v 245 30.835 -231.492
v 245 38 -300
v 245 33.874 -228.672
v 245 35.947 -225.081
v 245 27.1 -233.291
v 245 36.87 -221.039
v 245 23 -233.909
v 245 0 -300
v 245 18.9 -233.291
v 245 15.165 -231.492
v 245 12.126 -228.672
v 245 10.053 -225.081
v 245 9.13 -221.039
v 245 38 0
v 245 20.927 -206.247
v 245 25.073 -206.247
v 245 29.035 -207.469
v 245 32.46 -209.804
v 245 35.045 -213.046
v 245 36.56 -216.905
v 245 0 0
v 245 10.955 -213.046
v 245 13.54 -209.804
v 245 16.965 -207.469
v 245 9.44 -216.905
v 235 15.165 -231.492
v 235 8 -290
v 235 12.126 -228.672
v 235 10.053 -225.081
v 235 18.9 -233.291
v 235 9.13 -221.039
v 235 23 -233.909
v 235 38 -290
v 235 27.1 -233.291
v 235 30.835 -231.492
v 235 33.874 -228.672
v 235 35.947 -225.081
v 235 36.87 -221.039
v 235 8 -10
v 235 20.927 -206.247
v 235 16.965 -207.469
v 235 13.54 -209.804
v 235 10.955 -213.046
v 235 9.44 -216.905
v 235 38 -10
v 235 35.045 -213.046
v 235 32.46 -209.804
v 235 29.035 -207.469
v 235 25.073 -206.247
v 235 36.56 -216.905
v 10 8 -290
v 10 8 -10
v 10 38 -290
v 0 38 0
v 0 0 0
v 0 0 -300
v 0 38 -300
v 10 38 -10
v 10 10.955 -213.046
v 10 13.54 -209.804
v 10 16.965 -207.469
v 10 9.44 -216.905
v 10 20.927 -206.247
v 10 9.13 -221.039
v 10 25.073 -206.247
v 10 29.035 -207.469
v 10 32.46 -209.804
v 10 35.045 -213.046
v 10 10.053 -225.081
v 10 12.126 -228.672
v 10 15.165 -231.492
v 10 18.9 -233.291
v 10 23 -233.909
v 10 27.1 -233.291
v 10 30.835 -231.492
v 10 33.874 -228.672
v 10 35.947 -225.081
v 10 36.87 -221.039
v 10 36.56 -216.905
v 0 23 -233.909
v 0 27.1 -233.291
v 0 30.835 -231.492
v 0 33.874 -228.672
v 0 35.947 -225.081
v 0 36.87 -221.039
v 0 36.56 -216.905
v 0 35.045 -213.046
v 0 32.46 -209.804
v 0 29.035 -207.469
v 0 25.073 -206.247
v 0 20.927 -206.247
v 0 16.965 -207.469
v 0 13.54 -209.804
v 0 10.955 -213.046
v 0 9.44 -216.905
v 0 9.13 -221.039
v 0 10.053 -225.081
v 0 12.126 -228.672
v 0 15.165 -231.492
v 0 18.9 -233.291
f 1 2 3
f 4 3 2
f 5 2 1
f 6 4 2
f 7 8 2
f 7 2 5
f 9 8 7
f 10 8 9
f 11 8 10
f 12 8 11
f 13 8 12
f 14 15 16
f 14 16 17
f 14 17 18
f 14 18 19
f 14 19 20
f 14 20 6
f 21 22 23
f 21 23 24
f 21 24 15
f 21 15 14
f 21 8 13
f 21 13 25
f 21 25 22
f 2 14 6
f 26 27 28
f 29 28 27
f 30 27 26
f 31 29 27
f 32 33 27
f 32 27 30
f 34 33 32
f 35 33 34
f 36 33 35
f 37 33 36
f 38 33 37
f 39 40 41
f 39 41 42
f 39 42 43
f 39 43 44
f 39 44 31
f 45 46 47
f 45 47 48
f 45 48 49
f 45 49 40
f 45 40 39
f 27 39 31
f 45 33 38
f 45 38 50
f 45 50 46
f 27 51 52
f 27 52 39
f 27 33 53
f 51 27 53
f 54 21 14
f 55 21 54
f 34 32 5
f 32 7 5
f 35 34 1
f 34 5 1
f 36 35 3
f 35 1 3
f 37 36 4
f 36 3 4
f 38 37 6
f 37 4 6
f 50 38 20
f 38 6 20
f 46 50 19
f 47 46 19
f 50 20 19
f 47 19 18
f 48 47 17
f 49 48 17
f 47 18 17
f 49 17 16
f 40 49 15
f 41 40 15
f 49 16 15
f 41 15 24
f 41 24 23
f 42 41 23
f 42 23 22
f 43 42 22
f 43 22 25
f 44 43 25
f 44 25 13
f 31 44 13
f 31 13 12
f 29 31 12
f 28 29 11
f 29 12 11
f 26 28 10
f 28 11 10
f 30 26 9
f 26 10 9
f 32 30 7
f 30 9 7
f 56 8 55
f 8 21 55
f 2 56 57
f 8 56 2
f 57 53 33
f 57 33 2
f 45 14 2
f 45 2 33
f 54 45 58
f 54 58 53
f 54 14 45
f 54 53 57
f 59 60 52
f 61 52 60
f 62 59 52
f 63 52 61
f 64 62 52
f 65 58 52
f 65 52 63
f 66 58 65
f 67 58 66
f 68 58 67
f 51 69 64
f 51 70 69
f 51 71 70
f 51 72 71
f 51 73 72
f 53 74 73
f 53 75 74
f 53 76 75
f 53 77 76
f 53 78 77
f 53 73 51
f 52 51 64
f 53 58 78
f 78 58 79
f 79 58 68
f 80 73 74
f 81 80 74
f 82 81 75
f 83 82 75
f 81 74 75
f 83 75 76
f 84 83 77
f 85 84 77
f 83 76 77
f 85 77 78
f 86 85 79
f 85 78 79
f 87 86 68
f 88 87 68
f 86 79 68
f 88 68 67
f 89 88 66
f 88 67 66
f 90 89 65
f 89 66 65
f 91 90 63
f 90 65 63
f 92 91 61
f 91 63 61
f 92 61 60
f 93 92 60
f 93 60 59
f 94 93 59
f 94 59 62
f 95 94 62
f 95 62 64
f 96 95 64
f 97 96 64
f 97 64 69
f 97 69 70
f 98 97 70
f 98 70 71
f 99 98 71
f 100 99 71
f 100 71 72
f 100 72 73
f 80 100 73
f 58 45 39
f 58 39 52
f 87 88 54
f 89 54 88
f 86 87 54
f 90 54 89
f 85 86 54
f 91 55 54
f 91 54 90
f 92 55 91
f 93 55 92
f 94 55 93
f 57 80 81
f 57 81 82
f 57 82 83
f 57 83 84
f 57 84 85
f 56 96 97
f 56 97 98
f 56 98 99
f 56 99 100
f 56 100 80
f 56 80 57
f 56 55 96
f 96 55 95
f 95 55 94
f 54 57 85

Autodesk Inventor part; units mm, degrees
ref_plane "YZ Plane" through (0, 0, 0) normal (1, 0, 0) x (0, 1, 0)
ref_plane "XZ Plane" through (0, 0, 0) normal (0, 1, 0) x (-1, 0, 0)
ref_plane "XY Plane" through (0, 0, 0) normal (0, 0, 1) x (1, 0, 0)
sketch "Sketch1" plane through (0, 0, 0) normal (0, 1, 0) x (-1, 0, 0)
  line L0 (0, 0) -> (0, -250)
  line L1 (-200, 0) -> (0, 0)
  line L2 (0, -250) -> (0, -300)
  line L3 (0, -300) -> (-200, -300)
  line L4 (-200, -300) -> (-230, -300)
  line L5 (-230, 0) -> (-200, 0)
  line L6 (-230, -300) -> (-245, -300)
  line L7 (-245, -300) -> (-245, 0)
  line L8 (-245, 0) -> (-230, 0)
  dimension "d0" = 250
  dimension "d4" = 50
  dimension "d12" = 30
  dimension "d24" = 15
extrude "Extrusion1" add sketch "Sketch1" along normal blind 38
sketch "Sketch2" plane through (0, 38, 0) normal (0, 1, 0) x (1, 0, 0)
  line L0 (0, 300) -> (0, 0) projected
  line L1 (0, 0) -> (245, 0) projected
  line L2 (10, 10) -> (10, 290)
  line L3 (245, 300) -> (0, 300) projected
  line L4 (245, 0) -> (245, 300) projected
  line L5 (245, 290) -> (235, 290)
  line L6 (235, 290) -> (235, 10)
  line L7 (235, 290) -> (10, 290)
  line L8 (0, 300) -> (0, 0) projected
  line L9 (235, 10) -> (10, 10)
  dimension "d25" = 10
extrude "Extrusion2" cut sketch "Sketch2" against normal blind 30 contours L6 L9 L2 L7
sketch "Sketch5" plane through (0, 0, 0) normal (0, -1, 0) x (1, 0, 0)
  point P0 (0, 0)
sketch "Sketch6" plane through (0, 8, 0) normal (0, 1, 0) x (1, 0, 0)
  point P0 (0, 0)
sketch "Sketch7" plane through (0, 8, 0) normal (0, 1, 0) x (1, 0, 0)
  line L0 (10, 290) -> (235, 290) projected
  line L1 (235, 10) -> (10, 10) projected
  line L2 (235, 290) -> (10, 10)
  line L3 (10, 10) -> (10, 290) projected
  line L4 (235, 10) -> (10, 290)
  point P0 (0, 0)
sketch "Sketch8" plane through (245, 0, 0) normal (1, 0, 0) x (0, 0, -1)
  line L0 (0, 38) -> (300, 38) projected
  line L1 (0, 0) -> (300, 0) projected
  line L2 (0, 0) -> (0, 38) projected
  line L3 (150, 38) -> (150, 8)
  line L4 (290, 8) -> (10, 8) projected
  line L5 (150, 8) -> (290, 8)
  line L6 (290, 38) -> (290, 8) projected
  line L7 (290, 8) -> (290, 38)
  line L8 (290, 38) -> (150, 38)
  line L9 (290, 38) -> (10, 38) projected
  line L10 (150, 8) -> (290, 38)
  line L11 (290, 38) -> (150, 38)
  line L12 (290, 8) -> (150, 38)
  circle A0 centre (220, 23) radius 13.9087
extrude "Extrusion4" cut sketch "Sketch8" against normal blind 250 contours A0 L10 L12 | L12 L10 A0 | A0 L12 L10 | L10 L12 A0
equation "\"BendRadius\" = Thickness"
equation "\"BendReliefWidth\" = Thickness"
equation "\"BendReliefDepth\" = 0.5 * Thickness"
equation "\"CornerReliefSize\" = 4 * Thickness"
equation "\"MinimumRemnant\" = 2 * Thickness"
equation "\"TransitionRadius\" = BendRadius"
equation "\"JacobiRadiusSize\" = BendRadius"
equation "\"GapSize\" = Thickness"
equation "\"Thickness\" = 3.048"
properties part number "Case_3d_model_3DPrint"
